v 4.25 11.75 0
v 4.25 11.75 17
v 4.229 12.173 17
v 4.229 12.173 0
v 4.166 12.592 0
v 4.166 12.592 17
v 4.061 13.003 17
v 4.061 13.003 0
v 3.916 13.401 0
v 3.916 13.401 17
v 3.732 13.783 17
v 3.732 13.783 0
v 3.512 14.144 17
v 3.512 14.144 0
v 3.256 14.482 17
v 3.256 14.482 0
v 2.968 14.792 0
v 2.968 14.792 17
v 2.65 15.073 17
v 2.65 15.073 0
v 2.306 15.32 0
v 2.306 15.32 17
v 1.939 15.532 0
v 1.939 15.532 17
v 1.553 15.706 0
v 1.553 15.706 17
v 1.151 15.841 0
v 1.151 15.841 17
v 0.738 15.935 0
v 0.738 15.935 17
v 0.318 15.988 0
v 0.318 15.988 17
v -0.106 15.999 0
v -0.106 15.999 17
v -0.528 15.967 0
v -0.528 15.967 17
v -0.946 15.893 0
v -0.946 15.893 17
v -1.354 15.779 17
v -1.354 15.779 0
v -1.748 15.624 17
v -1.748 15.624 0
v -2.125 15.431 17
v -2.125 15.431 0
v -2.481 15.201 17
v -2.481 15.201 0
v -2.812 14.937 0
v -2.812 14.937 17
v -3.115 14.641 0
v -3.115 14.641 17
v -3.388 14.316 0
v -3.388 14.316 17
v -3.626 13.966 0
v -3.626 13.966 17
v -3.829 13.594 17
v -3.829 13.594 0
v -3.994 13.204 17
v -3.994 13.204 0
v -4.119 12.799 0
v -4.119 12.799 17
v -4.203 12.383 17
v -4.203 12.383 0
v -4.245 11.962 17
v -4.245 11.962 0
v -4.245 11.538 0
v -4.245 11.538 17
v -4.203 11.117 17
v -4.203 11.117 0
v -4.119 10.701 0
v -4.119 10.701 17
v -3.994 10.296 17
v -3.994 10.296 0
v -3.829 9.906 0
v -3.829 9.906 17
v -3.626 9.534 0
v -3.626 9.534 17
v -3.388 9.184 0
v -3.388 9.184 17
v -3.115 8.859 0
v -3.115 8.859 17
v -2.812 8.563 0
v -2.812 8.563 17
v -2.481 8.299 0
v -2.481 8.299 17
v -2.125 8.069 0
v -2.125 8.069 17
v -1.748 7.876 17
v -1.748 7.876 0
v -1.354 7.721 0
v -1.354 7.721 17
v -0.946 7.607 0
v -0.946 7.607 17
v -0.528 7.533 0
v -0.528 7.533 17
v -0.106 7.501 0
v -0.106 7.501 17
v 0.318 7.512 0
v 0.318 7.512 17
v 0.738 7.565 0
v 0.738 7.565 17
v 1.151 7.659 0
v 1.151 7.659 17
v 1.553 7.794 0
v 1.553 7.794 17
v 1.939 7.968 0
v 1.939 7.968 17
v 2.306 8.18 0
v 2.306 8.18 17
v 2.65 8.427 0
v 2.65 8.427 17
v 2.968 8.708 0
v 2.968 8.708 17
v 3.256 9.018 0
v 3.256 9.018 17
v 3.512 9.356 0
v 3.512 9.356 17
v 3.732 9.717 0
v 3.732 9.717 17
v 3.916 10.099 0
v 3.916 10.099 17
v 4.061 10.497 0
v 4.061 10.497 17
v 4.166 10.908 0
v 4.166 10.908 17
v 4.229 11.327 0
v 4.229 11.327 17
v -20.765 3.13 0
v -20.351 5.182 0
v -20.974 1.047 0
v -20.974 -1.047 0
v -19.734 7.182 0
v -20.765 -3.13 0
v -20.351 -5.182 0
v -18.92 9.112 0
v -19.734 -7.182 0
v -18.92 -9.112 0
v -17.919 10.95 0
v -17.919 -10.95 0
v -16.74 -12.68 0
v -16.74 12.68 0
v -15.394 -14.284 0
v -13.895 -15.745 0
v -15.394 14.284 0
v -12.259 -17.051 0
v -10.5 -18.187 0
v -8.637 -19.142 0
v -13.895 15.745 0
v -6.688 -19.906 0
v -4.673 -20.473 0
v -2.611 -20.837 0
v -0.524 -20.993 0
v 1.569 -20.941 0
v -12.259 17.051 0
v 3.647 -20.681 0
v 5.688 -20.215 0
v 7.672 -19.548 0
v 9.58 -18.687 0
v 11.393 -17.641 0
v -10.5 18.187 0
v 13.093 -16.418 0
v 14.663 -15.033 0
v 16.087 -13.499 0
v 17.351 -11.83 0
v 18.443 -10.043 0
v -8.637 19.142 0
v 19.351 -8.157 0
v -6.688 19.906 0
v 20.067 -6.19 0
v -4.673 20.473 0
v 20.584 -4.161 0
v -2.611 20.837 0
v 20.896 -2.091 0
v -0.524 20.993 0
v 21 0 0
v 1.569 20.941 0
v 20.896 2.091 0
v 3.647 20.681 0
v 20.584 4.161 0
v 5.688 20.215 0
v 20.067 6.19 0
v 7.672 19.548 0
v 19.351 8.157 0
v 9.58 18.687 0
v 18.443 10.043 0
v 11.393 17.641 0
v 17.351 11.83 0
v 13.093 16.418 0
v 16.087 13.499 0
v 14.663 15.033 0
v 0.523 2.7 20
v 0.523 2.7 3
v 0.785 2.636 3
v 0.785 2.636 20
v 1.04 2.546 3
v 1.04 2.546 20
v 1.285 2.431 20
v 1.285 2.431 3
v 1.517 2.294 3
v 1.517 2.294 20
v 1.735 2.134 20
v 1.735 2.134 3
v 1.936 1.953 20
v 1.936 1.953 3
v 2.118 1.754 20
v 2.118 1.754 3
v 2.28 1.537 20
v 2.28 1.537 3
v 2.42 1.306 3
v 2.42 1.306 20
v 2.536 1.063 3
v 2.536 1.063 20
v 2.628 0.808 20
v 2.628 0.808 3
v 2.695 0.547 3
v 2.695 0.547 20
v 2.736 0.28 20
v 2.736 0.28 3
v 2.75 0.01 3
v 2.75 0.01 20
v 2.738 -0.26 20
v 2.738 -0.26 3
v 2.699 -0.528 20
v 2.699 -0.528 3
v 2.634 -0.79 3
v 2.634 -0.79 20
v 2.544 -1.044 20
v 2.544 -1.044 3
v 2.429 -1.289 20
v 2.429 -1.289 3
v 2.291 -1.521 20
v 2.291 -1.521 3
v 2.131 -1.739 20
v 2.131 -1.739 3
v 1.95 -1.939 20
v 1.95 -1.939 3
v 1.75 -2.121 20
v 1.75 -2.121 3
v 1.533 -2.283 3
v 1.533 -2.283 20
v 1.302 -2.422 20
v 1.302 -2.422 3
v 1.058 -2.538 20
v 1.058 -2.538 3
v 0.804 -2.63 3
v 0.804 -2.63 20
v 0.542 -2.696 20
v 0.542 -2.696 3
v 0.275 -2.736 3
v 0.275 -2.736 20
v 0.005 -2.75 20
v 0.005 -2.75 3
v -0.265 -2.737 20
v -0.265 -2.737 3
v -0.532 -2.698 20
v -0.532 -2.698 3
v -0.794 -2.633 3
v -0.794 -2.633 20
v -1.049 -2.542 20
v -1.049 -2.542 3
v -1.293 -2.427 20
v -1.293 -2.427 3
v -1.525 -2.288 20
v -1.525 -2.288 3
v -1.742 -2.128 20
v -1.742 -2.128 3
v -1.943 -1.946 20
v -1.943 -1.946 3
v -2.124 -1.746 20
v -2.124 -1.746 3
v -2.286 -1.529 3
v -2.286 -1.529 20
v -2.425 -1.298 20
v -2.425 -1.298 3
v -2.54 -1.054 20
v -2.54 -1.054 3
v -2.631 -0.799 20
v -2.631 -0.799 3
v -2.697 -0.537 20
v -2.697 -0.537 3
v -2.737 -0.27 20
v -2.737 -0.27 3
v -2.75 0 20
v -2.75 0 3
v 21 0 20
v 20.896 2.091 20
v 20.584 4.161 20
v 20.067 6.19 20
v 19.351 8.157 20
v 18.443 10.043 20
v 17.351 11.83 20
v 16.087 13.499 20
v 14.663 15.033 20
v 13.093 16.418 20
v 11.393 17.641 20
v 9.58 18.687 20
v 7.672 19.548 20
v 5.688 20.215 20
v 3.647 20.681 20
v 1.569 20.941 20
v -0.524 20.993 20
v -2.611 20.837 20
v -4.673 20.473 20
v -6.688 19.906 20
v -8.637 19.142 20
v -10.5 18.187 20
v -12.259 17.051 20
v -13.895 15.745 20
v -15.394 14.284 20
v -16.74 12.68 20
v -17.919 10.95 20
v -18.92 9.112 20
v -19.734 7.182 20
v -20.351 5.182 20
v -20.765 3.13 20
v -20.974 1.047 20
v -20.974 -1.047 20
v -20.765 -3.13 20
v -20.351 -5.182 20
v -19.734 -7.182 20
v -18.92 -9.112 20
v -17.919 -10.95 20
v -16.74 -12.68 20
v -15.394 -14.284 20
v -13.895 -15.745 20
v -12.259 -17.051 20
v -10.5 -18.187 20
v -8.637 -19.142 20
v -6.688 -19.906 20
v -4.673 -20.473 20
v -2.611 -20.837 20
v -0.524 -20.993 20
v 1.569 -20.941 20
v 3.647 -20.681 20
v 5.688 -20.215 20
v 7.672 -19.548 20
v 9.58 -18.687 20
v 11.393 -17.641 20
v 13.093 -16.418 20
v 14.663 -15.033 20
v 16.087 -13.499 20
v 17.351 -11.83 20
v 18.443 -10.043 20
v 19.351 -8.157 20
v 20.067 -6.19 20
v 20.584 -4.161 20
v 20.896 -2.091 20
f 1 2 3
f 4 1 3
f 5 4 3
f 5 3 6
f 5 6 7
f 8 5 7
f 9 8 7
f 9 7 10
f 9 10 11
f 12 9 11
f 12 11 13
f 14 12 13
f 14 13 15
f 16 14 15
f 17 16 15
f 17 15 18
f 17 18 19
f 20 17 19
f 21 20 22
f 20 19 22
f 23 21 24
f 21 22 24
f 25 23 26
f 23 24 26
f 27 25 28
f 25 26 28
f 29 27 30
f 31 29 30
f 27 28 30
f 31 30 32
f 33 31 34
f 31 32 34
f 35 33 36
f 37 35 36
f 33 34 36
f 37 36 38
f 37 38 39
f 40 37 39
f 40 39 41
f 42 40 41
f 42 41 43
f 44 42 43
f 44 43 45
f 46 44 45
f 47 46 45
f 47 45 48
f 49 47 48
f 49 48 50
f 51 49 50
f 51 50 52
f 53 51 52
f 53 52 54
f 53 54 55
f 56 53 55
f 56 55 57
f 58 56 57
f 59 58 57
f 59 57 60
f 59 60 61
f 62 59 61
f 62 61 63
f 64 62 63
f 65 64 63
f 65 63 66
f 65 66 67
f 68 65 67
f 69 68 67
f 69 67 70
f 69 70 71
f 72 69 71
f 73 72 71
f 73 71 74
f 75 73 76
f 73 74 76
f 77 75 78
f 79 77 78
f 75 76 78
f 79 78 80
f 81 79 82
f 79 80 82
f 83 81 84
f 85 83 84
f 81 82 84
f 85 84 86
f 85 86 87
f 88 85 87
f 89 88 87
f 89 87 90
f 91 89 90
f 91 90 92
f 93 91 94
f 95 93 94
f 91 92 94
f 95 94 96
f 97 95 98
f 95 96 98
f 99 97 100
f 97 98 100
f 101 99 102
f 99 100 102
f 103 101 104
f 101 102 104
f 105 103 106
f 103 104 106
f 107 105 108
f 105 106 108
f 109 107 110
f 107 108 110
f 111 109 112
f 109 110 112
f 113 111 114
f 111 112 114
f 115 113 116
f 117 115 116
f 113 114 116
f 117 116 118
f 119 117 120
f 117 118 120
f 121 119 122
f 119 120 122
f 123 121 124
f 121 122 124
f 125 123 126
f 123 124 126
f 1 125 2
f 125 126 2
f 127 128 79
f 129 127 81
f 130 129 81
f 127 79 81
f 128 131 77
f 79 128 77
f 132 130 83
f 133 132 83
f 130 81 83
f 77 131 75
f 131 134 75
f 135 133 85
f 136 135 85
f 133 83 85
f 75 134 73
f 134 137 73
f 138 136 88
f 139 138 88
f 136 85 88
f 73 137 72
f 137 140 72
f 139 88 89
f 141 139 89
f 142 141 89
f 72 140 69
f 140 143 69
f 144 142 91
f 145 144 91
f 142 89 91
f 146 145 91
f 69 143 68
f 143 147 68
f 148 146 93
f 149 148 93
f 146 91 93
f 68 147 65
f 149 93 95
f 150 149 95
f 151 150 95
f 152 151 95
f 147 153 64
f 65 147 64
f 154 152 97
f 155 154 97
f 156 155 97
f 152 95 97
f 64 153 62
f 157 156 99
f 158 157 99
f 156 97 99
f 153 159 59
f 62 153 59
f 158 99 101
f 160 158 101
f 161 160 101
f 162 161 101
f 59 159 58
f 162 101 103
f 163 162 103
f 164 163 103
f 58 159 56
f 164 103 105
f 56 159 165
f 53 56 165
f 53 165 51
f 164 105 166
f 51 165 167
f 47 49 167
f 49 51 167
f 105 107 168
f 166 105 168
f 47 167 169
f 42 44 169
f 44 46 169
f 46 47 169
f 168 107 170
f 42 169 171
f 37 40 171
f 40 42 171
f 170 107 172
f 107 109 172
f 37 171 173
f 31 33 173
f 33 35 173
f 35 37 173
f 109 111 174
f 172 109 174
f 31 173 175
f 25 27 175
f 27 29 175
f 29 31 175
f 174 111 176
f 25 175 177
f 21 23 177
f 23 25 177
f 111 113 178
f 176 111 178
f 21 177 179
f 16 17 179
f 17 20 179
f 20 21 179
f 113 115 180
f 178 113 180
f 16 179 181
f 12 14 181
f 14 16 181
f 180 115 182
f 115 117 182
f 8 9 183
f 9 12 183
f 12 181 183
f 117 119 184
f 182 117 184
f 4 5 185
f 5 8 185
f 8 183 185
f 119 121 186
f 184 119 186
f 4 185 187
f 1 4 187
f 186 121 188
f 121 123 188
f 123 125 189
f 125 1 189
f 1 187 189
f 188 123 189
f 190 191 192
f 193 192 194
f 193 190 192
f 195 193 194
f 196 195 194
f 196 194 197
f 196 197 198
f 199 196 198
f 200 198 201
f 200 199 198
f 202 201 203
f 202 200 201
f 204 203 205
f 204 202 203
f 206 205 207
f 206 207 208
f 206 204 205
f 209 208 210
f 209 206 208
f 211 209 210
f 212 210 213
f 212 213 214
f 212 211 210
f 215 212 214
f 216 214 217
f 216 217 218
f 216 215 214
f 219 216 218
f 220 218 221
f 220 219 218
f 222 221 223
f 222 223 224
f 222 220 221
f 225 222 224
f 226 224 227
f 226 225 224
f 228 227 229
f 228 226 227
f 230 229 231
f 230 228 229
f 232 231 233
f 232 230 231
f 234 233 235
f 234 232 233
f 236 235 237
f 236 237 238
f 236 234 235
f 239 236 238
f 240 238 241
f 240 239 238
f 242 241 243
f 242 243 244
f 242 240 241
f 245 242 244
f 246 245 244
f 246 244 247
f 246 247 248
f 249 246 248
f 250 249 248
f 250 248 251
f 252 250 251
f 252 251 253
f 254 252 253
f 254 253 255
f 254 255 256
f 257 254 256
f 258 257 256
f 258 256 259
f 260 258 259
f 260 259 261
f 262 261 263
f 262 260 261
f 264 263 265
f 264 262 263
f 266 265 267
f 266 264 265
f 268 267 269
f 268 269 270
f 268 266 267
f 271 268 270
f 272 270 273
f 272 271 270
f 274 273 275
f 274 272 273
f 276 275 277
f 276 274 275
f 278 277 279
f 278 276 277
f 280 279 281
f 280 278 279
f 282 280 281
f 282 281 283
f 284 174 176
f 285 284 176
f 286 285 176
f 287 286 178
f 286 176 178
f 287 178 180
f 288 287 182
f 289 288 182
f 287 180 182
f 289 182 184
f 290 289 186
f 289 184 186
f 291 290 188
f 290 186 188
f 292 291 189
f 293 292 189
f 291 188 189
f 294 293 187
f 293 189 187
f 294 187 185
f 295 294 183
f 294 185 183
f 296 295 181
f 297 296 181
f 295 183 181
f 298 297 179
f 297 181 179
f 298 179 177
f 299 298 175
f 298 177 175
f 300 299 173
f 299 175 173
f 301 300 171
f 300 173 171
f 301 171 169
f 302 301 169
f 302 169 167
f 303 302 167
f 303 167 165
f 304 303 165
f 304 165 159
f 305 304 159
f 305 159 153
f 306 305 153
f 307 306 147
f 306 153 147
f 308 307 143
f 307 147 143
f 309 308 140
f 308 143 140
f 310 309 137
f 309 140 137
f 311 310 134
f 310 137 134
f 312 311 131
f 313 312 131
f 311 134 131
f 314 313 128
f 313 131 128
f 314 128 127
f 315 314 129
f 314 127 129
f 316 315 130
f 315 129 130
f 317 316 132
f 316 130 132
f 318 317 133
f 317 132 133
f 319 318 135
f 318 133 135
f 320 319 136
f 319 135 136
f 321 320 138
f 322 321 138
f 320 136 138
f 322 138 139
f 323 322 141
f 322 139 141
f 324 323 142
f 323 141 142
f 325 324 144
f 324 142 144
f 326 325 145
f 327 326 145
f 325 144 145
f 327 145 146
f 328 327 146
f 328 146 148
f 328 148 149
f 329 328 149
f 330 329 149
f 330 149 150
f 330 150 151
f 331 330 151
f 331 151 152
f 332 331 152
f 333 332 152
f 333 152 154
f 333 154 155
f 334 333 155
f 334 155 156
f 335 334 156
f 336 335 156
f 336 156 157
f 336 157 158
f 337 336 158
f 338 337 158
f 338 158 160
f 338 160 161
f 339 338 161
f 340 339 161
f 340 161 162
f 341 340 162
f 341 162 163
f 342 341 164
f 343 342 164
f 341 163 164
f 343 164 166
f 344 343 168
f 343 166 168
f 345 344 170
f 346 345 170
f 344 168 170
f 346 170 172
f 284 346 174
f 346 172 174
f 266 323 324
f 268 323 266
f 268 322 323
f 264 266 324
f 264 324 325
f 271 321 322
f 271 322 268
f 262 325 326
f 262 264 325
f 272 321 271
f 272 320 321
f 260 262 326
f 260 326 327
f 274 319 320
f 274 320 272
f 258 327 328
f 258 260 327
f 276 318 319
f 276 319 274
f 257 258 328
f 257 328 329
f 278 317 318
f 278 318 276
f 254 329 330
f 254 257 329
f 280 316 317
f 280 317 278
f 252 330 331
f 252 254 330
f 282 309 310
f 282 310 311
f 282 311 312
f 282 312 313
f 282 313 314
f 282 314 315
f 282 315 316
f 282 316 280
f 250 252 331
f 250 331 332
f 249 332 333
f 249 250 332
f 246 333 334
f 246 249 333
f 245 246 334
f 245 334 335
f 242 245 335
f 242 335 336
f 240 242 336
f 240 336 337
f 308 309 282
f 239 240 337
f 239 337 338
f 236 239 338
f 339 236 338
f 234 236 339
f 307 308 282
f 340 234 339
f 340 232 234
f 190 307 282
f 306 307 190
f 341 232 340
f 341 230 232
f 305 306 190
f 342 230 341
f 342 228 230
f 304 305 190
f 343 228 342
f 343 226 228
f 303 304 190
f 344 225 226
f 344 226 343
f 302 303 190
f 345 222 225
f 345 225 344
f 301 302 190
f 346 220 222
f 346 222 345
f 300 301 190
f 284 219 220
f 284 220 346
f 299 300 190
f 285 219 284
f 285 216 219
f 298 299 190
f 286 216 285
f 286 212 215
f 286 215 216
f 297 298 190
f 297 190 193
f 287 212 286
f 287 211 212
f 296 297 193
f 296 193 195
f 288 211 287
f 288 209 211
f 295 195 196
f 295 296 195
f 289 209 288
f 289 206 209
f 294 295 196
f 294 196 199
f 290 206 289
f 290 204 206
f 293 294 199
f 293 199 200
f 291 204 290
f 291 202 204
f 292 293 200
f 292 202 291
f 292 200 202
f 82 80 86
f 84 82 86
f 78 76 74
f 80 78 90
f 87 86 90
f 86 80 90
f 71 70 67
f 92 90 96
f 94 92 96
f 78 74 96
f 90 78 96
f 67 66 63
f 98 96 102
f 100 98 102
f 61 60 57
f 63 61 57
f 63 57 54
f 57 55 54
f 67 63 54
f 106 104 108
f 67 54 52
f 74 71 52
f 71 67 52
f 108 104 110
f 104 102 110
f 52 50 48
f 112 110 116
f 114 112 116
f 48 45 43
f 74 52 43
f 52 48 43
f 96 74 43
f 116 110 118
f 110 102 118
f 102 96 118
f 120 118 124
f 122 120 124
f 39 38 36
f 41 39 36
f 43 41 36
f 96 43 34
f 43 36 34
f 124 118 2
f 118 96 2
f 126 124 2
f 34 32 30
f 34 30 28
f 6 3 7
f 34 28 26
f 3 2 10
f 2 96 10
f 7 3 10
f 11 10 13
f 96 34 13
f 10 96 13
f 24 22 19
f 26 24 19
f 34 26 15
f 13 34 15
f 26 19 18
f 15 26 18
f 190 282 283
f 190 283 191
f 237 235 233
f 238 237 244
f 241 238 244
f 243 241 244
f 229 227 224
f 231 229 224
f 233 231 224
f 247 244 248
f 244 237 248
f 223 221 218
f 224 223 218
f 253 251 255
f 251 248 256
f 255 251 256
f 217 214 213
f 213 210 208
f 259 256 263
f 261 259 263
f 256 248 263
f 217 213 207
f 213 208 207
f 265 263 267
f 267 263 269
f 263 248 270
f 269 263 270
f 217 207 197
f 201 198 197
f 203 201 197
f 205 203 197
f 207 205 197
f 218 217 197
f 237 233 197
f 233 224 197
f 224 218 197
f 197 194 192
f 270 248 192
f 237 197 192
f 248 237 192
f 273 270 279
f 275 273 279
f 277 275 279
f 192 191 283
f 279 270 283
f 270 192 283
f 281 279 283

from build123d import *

# Parameters (mm, degrees)
SKETCH1_R           = 21
BOSS_EXTRUDE1_DEPTH = 20
CUT_EXTRUDE1_DEPTH  = 17
CUT_EXTRUDE2_START  = -3
SKETCH3_R           = 4.25
CUT_EXTRUDE2_DEPTH  = 18


with BuildPart() as part:
    # Sketch1 → Boss-Extrude1 (new body)
    with BuildSketch(Plane.XY):
        Circle(SKETCH1_R)
    extrude(amount=BOSS_EXTRUDE1_DEPTH)

    # Sketch2 → Cut-Extrude1 (cut)
    with BuildSketch(Plane.XY.offset(20)):
        with BuildLine():
            Line((-2.75, 0), (0.522727273, 2.699862255))
            ThreePointArc((0.522727273, 2.699862255), (1.75, -2.121320344), (-2.75, 0))
        make_face()
    extrude(amount=-CUT_EXTRUDE1_DEPTH, mode=Mode.SUBTRACT)

    # Sketch3 → Cut-Extrude2 (cut)
    with BuildSketch(Plane.XY.offset(20).offset(CUT_EXTRUDE2_START)):
        with Locations((0, 11.75)):
            Circle(SKETCH3_R)
    extrude(amount=-CUT_EXTRUDE2_DEPTH, mode=Mode.SUBTRACT)


solid = part.part
